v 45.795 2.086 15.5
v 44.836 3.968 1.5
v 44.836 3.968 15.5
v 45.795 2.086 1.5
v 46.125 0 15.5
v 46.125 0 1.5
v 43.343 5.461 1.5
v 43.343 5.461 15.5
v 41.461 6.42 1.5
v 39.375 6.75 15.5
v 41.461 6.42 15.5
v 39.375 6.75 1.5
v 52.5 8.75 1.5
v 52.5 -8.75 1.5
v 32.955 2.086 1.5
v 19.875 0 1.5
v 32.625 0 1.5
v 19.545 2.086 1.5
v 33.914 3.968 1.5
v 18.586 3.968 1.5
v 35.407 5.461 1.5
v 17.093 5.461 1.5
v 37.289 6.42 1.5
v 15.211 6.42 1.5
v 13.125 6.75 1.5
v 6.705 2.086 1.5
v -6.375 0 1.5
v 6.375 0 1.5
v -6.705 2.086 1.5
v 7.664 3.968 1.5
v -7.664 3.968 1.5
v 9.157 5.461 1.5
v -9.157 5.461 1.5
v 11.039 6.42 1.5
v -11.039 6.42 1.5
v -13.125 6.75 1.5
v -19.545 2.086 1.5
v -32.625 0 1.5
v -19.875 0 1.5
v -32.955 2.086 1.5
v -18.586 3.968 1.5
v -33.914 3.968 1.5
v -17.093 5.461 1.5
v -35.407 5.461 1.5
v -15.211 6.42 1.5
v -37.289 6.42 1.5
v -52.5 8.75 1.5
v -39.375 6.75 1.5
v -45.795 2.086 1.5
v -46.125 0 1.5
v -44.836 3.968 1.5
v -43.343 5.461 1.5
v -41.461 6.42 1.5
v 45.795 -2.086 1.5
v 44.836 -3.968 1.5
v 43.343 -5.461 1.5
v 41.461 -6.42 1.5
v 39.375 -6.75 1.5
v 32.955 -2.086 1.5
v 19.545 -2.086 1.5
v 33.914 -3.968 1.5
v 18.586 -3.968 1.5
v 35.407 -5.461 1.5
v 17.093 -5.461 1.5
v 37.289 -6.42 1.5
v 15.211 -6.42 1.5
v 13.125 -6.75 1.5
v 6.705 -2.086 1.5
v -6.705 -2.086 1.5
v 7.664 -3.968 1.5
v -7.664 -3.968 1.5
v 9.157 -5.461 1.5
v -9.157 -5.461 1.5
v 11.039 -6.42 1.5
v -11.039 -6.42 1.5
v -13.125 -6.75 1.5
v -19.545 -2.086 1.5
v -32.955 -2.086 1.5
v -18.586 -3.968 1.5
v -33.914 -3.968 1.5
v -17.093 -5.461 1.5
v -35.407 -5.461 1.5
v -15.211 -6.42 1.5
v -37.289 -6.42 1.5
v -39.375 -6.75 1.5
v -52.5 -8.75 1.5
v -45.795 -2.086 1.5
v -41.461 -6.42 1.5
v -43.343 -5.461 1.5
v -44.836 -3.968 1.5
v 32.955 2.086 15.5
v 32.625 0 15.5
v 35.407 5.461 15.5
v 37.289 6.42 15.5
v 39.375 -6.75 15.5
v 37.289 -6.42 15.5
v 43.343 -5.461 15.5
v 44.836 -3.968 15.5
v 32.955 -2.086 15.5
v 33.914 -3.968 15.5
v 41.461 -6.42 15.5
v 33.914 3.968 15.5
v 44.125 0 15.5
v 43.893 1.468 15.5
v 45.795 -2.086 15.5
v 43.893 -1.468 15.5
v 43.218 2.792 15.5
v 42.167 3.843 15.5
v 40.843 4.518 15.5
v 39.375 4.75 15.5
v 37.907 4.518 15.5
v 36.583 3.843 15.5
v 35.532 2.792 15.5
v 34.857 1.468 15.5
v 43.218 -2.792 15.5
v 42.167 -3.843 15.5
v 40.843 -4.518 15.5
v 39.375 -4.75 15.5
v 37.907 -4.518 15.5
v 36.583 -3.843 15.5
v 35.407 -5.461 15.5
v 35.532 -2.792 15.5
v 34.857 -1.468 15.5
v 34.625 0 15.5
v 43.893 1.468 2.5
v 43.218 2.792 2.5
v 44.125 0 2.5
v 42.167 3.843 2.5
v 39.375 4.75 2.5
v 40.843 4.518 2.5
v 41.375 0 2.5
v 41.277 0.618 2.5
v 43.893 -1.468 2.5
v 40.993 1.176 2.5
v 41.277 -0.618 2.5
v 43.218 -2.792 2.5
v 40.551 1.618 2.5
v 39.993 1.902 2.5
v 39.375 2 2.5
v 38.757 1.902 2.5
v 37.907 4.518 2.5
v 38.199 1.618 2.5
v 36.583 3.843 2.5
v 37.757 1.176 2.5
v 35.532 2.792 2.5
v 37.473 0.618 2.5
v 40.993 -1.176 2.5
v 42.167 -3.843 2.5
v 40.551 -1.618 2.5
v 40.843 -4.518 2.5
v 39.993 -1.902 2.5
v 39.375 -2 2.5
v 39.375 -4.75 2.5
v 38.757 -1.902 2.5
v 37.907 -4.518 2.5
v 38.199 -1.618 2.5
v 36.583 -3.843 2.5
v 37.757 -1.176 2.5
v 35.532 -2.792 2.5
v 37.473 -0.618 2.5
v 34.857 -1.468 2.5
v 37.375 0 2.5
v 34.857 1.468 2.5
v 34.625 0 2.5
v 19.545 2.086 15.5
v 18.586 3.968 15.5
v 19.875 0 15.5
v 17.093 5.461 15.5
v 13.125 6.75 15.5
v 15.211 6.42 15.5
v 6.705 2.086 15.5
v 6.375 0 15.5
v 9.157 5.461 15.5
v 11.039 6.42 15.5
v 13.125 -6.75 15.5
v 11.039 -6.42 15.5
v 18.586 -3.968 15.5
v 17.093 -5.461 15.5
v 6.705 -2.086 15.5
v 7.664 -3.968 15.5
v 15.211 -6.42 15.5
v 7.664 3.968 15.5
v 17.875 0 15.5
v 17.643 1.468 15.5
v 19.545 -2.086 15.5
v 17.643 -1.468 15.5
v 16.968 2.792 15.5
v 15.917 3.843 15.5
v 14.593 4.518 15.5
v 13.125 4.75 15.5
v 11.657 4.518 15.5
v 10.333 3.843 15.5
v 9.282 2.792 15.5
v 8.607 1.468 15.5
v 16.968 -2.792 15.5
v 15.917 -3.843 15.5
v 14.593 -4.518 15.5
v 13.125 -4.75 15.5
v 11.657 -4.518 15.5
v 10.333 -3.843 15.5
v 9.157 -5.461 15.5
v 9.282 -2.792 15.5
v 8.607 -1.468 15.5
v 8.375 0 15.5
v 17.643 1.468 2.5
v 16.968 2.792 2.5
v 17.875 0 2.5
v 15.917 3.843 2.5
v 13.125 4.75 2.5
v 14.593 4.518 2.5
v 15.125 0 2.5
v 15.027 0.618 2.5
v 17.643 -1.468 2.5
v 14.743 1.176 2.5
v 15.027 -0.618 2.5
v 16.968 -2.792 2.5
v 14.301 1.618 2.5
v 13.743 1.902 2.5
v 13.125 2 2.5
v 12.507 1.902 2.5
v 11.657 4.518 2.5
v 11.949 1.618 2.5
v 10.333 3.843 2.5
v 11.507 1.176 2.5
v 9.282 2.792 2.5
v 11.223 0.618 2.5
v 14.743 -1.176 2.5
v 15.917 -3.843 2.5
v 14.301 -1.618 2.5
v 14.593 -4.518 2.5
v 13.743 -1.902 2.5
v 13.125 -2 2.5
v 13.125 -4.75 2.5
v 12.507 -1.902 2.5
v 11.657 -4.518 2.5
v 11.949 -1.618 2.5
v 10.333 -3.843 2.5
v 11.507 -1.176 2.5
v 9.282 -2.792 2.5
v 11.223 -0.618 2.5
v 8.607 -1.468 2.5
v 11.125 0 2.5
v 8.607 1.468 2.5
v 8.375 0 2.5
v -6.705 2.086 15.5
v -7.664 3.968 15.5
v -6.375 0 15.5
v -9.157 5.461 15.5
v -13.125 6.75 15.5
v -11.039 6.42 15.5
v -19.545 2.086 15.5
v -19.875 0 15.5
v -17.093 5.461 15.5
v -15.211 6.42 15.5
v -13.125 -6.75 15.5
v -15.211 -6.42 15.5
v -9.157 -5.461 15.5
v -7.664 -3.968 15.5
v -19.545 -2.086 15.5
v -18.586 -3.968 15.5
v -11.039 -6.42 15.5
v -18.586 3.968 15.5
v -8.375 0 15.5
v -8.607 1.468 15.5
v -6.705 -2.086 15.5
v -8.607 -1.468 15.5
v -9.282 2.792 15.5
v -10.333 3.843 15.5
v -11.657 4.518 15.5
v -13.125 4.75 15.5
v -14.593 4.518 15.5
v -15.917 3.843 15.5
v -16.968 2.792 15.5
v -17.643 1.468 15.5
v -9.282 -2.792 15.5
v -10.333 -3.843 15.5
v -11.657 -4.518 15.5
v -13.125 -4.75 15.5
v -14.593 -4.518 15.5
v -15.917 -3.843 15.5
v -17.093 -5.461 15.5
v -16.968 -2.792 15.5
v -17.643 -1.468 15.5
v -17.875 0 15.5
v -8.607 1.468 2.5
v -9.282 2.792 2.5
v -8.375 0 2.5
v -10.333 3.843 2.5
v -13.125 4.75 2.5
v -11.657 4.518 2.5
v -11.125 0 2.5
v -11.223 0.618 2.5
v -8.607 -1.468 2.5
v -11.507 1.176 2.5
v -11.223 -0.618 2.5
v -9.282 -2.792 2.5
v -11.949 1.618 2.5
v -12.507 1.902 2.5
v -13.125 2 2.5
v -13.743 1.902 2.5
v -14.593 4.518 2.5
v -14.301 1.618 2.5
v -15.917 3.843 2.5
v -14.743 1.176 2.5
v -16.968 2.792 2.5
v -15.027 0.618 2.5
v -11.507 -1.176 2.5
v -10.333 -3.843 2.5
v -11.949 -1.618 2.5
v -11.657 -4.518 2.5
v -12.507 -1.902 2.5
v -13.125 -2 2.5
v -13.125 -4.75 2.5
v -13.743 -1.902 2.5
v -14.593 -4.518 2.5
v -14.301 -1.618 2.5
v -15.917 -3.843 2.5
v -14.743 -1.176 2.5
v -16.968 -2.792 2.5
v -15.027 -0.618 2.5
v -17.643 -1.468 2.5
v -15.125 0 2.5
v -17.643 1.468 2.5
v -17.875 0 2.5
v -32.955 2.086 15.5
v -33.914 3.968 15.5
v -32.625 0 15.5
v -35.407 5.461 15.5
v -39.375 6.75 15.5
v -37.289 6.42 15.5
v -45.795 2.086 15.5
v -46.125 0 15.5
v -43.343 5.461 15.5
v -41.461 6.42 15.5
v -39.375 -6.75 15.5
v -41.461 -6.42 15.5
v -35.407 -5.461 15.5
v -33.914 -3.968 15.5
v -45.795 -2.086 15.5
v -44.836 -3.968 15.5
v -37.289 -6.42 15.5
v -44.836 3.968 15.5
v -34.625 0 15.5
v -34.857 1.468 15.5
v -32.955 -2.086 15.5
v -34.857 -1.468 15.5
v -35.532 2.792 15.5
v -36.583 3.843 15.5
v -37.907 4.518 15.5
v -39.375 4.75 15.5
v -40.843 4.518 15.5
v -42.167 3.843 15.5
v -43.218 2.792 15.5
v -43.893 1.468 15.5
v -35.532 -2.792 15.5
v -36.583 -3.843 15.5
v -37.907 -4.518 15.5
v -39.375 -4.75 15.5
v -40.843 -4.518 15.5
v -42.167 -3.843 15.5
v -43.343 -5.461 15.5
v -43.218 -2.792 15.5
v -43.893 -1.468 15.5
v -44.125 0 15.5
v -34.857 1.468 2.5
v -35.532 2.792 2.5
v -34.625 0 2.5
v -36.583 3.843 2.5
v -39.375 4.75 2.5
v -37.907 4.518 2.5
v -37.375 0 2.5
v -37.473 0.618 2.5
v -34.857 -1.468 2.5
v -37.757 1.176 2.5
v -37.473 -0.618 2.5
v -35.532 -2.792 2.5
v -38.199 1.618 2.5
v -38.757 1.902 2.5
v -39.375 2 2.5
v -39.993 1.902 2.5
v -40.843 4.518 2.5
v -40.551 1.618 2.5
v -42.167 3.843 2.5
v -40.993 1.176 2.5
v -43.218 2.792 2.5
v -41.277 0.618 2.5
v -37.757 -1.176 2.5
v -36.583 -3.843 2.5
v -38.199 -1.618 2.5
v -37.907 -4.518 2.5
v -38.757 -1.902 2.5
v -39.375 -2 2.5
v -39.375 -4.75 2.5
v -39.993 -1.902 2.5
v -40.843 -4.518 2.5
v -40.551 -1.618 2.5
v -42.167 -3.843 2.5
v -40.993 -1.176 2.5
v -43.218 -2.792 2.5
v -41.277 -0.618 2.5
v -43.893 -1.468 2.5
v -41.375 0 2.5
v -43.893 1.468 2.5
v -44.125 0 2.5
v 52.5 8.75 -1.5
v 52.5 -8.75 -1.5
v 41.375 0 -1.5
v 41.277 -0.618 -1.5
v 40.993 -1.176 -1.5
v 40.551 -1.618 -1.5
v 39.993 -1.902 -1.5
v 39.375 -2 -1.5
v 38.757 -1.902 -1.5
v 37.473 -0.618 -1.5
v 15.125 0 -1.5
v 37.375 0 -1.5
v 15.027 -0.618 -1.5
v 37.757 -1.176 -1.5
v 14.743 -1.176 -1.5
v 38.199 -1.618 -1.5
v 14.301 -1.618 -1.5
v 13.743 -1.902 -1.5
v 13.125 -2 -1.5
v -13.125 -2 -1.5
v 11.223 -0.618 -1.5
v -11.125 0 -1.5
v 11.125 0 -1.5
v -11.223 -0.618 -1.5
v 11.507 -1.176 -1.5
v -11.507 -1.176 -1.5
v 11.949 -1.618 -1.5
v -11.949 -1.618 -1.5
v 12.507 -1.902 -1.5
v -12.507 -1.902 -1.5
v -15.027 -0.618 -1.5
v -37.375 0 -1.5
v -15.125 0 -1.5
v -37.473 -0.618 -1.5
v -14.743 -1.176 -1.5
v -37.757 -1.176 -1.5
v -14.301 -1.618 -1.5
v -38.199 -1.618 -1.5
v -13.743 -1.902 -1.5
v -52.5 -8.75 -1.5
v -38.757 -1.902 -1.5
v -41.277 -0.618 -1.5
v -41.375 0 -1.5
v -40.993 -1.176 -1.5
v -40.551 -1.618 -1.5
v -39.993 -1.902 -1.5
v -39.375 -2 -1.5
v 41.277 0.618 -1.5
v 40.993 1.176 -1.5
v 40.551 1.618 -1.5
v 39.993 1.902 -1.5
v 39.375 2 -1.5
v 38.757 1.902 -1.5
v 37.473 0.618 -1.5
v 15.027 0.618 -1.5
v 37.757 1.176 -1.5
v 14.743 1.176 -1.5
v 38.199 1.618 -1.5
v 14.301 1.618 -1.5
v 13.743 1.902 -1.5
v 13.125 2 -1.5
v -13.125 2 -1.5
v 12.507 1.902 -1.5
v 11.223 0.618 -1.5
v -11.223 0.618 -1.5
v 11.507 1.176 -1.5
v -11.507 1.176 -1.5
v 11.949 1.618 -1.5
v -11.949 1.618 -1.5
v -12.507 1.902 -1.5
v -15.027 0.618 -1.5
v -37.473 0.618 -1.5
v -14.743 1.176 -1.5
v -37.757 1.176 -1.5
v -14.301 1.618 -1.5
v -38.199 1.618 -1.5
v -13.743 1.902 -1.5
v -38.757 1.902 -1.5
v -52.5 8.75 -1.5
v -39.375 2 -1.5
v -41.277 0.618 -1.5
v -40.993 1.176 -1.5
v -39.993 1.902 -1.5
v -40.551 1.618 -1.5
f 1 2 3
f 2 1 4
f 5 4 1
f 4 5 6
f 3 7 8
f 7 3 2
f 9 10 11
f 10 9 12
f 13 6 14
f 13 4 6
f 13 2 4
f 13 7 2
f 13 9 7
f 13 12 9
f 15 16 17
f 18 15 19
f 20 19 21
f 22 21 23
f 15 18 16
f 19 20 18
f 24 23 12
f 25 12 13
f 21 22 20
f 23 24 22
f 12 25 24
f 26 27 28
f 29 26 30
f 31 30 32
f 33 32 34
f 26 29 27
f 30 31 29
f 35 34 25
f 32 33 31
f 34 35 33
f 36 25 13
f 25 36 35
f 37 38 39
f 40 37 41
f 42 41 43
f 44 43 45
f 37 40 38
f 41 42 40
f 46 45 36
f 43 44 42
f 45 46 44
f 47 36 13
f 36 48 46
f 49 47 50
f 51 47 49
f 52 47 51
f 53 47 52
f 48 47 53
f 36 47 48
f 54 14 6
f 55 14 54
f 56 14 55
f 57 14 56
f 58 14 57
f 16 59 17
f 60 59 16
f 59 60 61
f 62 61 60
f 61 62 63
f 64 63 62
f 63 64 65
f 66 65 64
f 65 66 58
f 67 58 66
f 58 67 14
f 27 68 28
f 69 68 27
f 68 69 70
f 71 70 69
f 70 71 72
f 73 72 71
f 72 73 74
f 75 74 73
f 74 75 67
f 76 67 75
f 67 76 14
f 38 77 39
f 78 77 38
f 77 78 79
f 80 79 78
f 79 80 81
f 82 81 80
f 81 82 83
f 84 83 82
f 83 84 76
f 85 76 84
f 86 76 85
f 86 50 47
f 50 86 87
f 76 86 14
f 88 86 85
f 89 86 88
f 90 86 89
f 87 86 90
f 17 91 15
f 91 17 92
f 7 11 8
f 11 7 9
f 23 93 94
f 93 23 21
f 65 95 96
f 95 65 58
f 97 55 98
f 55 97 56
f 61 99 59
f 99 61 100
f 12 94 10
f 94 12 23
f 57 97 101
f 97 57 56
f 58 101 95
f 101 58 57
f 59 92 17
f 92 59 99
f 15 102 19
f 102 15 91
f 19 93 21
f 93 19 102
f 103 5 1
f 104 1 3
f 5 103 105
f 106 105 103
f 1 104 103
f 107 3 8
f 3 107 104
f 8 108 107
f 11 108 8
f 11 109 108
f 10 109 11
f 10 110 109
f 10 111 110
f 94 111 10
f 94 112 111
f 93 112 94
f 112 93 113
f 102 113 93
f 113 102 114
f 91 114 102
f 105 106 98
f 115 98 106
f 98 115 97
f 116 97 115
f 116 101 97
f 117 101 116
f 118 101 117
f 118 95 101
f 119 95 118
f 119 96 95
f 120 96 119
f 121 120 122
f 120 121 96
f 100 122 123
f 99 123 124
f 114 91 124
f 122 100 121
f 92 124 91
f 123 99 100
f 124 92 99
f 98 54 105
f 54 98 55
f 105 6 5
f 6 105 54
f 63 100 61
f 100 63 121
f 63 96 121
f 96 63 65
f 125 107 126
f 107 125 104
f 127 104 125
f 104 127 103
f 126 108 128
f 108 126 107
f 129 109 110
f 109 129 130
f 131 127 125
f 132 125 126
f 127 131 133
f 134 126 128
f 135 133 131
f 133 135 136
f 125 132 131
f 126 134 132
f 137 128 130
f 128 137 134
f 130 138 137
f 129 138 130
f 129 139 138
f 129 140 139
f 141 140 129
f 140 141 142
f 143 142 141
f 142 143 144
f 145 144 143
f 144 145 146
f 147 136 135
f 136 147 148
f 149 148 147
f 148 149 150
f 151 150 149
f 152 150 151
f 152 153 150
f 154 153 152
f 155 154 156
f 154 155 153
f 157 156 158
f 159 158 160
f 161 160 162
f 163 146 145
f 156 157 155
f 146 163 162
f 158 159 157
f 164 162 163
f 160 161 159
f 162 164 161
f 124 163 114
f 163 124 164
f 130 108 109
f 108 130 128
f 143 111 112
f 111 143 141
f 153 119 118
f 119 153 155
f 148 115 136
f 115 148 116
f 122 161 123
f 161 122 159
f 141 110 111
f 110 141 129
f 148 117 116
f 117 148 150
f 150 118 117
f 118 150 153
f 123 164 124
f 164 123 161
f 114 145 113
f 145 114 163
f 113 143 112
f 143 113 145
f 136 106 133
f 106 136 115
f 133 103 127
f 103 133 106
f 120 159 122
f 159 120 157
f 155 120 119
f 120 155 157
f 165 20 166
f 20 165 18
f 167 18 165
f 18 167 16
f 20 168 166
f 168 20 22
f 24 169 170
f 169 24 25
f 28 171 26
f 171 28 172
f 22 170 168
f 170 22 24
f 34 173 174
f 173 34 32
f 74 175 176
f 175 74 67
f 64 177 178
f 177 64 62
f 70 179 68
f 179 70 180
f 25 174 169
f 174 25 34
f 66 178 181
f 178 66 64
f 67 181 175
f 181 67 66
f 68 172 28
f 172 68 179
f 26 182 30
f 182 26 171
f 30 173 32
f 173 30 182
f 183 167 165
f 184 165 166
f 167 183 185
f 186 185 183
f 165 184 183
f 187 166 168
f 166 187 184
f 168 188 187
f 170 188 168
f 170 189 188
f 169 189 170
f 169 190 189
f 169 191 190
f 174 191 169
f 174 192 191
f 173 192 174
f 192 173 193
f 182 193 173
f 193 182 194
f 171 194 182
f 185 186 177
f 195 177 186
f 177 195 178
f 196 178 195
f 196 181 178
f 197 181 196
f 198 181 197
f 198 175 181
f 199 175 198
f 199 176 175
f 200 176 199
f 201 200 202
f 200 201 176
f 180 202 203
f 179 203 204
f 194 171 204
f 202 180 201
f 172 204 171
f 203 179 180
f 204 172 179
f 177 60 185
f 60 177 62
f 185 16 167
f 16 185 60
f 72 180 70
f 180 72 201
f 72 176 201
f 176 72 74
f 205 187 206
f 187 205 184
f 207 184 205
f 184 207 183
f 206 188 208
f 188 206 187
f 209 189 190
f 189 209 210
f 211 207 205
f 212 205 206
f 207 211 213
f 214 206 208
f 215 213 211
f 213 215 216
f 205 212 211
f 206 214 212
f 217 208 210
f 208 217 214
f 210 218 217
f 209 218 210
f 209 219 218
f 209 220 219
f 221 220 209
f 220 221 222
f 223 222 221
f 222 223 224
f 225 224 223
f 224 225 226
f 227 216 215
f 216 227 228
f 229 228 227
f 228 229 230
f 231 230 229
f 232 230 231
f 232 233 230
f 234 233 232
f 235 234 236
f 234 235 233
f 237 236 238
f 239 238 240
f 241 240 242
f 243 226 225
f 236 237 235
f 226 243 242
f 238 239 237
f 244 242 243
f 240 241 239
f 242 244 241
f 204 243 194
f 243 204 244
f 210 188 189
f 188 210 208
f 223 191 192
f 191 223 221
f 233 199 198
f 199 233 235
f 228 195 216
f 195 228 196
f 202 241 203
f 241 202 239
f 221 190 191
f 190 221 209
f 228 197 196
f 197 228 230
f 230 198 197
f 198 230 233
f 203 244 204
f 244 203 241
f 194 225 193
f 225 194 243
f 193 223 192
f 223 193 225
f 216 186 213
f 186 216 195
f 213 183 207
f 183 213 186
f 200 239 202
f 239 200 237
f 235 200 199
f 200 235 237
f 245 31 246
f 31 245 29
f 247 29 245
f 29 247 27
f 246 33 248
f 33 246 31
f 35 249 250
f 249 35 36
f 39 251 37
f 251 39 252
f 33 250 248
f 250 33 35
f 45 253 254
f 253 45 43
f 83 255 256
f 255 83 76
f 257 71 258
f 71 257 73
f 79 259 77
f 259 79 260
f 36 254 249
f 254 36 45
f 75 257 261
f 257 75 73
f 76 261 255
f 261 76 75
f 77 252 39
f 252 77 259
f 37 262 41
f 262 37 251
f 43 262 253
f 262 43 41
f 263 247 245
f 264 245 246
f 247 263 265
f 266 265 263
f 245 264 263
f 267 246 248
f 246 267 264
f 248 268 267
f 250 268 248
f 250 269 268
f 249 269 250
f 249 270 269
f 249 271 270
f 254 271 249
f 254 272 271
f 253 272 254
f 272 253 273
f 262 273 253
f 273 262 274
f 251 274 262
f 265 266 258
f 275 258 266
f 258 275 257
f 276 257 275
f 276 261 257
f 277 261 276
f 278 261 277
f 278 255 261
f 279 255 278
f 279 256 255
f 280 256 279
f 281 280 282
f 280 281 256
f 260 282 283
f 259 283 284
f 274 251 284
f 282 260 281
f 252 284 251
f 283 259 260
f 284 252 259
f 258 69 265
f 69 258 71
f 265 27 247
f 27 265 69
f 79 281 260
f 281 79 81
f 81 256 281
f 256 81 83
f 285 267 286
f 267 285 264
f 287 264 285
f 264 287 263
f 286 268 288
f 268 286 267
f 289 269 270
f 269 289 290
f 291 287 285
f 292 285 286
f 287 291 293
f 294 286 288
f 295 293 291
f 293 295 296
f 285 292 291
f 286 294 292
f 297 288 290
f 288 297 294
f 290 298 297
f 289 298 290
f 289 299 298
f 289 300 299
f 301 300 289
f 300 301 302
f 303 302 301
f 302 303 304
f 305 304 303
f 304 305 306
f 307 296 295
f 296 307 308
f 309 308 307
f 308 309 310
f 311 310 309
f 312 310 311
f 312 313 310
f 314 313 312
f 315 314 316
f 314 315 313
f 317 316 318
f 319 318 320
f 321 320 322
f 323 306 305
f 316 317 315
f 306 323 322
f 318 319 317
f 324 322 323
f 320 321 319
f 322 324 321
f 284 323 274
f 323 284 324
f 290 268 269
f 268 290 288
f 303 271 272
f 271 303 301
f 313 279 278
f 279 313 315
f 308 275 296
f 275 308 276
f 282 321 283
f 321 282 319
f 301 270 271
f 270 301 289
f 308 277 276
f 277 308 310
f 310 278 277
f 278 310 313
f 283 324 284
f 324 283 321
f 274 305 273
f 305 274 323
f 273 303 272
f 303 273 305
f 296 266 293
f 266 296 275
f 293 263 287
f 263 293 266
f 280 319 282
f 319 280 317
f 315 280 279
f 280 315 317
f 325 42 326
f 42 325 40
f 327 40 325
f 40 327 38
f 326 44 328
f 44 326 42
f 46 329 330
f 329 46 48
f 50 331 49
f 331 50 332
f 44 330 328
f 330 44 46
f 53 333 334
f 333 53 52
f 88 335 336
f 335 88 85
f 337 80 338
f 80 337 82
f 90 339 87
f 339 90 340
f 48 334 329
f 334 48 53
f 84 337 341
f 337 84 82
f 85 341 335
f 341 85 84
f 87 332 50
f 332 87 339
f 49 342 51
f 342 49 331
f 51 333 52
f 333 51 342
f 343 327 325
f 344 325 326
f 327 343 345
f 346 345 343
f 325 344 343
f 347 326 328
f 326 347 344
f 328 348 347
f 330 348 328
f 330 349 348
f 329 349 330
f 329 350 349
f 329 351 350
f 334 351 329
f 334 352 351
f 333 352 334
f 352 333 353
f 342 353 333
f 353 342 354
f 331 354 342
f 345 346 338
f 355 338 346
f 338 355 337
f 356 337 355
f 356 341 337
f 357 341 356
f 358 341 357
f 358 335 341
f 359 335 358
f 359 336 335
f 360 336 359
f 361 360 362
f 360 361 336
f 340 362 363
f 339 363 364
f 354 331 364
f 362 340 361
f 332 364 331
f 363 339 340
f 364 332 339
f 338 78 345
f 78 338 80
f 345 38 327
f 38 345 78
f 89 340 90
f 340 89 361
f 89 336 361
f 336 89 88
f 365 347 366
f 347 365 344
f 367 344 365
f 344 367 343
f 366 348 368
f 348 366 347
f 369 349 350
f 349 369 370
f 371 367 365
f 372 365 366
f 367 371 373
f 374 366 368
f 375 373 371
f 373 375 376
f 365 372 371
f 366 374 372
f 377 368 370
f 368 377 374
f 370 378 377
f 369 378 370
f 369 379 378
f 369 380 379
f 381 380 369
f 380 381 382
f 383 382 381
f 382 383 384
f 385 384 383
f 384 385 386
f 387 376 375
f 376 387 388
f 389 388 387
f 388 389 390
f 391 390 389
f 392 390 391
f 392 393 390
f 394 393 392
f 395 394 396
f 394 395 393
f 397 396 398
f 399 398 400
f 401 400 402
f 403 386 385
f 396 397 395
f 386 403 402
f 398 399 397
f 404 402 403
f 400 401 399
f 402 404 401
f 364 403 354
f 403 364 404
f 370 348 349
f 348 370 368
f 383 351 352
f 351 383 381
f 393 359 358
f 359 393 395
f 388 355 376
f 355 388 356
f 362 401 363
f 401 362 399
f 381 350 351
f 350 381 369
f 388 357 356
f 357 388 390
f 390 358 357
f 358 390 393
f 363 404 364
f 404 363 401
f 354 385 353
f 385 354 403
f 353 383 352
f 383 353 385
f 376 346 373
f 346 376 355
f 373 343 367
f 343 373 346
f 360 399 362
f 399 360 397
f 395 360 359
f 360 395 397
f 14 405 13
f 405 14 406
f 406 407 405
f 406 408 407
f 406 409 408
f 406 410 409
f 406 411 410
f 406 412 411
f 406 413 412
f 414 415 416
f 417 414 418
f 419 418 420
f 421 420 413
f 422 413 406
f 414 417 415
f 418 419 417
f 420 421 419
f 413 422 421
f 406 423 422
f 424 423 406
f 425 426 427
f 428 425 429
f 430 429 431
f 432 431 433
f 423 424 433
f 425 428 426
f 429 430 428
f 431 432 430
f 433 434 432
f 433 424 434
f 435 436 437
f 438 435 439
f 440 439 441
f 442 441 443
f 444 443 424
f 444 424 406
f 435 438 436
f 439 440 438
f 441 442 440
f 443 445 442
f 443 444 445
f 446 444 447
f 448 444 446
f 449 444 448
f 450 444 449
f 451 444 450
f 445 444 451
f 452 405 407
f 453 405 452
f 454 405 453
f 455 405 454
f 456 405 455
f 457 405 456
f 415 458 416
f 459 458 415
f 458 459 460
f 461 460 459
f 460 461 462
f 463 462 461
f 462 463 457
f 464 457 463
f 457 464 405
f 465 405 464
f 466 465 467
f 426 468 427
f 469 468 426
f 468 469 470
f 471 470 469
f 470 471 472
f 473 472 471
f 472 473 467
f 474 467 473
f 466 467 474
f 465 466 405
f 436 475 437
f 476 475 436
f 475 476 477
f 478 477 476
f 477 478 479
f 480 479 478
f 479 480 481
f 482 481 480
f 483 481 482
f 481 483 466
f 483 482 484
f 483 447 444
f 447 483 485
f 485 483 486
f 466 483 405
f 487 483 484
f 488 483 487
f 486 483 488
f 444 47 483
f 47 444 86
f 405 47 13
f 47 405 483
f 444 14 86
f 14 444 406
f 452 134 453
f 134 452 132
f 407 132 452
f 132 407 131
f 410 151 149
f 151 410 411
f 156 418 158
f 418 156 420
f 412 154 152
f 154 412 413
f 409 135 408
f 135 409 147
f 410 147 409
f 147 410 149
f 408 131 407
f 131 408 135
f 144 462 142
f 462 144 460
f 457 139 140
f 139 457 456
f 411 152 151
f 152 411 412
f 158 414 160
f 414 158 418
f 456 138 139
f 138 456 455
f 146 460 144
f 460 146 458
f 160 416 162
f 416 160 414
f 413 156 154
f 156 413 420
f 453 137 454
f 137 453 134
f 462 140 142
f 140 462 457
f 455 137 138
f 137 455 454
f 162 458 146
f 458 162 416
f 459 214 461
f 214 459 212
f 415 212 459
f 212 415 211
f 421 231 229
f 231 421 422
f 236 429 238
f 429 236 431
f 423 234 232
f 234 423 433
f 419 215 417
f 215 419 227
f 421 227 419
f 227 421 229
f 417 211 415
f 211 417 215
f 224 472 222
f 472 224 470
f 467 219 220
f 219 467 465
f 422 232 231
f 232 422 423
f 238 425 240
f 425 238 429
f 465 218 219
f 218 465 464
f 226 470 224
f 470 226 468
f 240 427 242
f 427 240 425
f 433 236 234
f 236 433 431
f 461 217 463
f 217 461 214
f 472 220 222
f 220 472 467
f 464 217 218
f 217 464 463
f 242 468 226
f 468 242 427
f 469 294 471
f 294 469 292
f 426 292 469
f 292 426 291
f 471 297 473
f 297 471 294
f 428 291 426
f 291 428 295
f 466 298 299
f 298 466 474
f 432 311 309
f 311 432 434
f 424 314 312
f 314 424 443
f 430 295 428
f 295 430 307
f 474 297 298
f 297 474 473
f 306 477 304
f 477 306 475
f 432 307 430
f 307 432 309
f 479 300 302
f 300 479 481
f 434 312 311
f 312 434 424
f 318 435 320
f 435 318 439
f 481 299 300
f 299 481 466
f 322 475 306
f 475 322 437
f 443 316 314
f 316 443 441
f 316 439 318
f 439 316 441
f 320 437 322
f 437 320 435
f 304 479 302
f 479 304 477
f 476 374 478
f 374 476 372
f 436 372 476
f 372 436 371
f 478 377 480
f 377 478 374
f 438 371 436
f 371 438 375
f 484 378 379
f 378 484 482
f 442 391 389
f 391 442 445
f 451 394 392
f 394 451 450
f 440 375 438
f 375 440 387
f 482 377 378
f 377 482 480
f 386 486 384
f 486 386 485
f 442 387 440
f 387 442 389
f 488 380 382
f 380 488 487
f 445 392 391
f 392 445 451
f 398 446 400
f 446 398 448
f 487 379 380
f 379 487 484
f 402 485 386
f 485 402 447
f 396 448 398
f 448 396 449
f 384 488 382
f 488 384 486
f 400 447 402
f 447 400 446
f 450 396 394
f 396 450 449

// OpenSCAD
$fn = 20;

FOOTPRINT_WIDTH = 13.5;
FOOTPRINT_DEEP = 14;

SOCKET_MAX_SIZE = 26 + 0.25;
SOCKET_COUNT = 4;

BASE_THICKNESS = 3;
BASE_WIDTH = SOCKET_MAX_SIZE / 1.5;

HOLE_DIAMETER = 4;

module positioner() {
    for (x = [ 0 : SOCKET_COUNT - 1 ]) {
        translate([ - x * SOCKET_MAX_SIZE + ((SOCKET_COUNT - 1 ) * SOCKET_MAX_SIZE / 2), 0, BASE_THICKNESS / 2 ]) {
            for (i = [0 : $children - 1]) {
                children(i);
            }
        }
    }
}

module main() {

    difference () {
        union() {
            cube(size = [ SOCKET_MAX_SIZE * SOCKET_COUNT, BASE_WIDTH, BASE_THICKNESS ], center = true);

            positioner() {
                difference() {
                    cylinder(r = FOOTPRINT_WIDTH / 2, h = FOOTPRINT_DEEP);
                    translate([0, 0, 1]) {
                        cylinder(r = FOOTPRINT_WIDTH / 2 - 2, h = FOOTPRINT_DEEP);
                    }
                }

                %cylinder(r = SOCKET_MAX_SIZE / 2, h = FOOTPRINT_DEEP);
            }
        }

        // Hole
        translate([0, 0, -25]) {
            positioner() {
                cylinder(r = HOLE_DIAMETER / 2, h = 50);
            }
        }
    }
}

if (1) {
    main();
} else {
    intersection() {
        main();
        translate([SOCKET_MAX_SIZE / 2, 0, 0]) {
            cube(size = [SOCKET_MAX_SIZE, BASE_WIDTH, 100], center = true);
        }
    }
}
